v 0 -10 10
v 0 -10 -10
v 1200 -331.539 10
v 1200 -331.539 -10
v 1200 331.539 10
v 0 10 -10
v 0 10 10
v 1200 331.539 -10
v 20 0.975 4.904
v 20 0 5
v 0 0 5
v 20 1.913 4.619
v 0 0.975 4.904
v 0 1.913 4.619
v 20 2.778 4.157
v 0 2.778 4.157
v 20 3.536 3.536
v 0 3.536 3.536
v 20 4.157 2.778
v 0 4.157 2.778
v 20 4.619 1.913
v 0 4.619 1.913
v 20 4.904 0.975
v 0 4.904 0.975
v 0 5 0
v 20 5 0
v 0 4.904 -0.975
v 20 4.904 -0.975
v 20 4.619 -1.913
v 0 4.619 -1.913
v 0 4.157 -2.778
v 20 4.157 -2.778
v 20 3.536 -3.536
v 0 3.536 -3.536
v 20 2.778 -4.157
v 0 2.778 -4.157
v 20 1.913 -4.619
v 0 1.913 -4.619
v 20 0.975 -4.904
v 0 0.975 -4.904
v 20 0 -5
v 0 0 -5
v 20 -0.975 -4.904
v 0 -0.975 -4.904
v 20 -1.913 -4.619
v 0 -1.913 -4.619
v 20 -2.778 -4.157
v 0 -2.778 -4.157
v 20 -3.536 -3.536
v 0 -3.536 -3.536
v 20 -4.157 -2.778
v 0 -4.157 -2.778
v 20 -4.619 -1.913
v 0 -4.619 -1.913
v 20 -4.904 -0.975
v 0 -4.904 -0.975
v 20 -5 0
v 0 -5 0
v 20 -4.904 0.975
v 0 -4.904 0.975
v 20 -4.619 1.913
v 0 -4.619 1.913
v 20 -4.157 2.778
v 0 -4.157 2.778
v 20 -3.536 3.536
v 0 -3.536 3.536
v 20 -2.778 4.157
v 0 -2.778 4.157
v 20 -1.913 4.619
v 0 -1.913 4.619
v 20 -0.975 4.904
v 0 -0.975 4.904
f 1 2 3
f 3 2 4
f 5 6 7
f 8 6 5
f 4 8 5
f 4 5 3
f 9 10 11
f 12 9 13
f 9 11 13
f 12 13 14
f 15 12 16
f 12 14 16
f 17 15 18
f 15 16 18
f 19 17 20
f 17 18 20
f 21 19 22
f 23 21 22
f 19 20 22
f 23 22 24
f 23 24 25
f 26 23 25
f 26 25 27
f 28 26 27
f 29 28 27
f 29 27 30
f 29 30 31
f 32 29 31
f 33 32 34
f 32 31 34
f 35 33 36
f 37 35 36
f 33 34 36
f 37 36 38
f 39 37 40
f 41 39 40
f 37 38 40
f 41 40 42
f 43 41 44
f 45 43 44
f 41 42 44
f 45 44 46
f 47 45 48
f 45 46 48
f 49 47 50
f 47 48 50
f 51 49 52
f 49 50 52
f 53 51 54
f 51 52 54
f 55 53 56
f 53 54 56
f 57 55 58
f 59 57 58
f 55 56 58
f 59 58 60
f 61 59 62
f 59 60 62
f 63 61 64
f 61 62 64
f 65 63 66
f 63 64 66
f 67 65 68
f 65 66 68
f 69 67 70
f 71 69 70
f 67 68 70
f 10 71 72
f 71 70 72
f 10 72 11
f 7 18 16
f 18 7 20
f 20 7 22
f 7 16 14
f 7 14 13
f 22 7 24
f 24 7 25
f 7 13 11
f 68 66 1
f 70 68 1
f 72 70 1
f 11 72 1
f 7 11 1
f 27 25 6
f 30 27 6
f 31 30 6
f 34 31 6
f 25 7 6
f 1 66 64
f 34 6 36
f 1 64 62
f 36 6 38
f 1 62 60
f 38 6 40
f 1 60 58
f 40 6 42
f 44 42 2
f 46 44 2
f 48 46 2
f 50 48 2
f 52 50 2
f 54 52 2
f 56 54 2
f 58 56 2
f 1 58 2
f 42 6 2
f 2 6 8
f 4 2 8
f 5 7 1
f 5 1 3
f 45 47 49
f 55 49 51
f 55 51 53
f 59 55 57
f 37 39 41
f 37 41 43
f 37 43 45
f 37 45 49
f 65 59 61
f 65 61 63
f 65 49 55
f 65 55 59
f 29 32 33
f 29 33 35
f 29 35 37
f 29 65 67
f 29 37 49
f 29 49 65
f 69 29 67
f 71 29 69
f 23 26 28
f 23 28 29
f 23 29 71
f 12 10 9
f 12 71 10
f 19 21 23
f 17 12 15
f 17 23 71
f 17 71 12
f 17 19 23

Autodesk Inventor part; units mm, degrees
ref_plane "YZ Plane" through (0, 0, 0) normal (1, 0, 0) x (0, 1, 0)
ref_plane "XZ Plane" through (0, 0, 0) normal (0, 1, 0) x (-1, 0, 0)
ref_plane "XY Plane" through (0, 0, 0) normal (0, 0, 1) x (1, 0, 0)
sketch "Náčrt6" plane through (0, 0, 0) normal (0, 0, 1) x (1, 0, 0)
  line L0 (0, 10) -> (1200, 331.539)
  line L1 (0, 10) -> (0, 0)
  line L2 (0, -10) -> (1200, -331.539)
  line L3 (1200, 331.539) -> (1200, 0)
  line L4 (0, 0) -> (1200, 0) construction
  line L5 (1200, 0) -> (1200, -331.539)
  line L6 (0, 0) -> (0, -10)
  dimension "d15" = 20
  dimension "d16" = 30
  dimension "d17" = 1200
extrude "Vysunutí3" add sketch "Náčrt6" along normal mid plane 20
sketch "Náčrt7" plane through (0, -10, 10) normal (-1, 0, 0) x (0, 0, 1)
  circle A0 centre (-10, 10) radius 5
  dimension "d22" = 10
extrude "Vysunutí4" cut sketch "Náčrt7" against normal blind 20
properties part number "Pieskovy_luc"
